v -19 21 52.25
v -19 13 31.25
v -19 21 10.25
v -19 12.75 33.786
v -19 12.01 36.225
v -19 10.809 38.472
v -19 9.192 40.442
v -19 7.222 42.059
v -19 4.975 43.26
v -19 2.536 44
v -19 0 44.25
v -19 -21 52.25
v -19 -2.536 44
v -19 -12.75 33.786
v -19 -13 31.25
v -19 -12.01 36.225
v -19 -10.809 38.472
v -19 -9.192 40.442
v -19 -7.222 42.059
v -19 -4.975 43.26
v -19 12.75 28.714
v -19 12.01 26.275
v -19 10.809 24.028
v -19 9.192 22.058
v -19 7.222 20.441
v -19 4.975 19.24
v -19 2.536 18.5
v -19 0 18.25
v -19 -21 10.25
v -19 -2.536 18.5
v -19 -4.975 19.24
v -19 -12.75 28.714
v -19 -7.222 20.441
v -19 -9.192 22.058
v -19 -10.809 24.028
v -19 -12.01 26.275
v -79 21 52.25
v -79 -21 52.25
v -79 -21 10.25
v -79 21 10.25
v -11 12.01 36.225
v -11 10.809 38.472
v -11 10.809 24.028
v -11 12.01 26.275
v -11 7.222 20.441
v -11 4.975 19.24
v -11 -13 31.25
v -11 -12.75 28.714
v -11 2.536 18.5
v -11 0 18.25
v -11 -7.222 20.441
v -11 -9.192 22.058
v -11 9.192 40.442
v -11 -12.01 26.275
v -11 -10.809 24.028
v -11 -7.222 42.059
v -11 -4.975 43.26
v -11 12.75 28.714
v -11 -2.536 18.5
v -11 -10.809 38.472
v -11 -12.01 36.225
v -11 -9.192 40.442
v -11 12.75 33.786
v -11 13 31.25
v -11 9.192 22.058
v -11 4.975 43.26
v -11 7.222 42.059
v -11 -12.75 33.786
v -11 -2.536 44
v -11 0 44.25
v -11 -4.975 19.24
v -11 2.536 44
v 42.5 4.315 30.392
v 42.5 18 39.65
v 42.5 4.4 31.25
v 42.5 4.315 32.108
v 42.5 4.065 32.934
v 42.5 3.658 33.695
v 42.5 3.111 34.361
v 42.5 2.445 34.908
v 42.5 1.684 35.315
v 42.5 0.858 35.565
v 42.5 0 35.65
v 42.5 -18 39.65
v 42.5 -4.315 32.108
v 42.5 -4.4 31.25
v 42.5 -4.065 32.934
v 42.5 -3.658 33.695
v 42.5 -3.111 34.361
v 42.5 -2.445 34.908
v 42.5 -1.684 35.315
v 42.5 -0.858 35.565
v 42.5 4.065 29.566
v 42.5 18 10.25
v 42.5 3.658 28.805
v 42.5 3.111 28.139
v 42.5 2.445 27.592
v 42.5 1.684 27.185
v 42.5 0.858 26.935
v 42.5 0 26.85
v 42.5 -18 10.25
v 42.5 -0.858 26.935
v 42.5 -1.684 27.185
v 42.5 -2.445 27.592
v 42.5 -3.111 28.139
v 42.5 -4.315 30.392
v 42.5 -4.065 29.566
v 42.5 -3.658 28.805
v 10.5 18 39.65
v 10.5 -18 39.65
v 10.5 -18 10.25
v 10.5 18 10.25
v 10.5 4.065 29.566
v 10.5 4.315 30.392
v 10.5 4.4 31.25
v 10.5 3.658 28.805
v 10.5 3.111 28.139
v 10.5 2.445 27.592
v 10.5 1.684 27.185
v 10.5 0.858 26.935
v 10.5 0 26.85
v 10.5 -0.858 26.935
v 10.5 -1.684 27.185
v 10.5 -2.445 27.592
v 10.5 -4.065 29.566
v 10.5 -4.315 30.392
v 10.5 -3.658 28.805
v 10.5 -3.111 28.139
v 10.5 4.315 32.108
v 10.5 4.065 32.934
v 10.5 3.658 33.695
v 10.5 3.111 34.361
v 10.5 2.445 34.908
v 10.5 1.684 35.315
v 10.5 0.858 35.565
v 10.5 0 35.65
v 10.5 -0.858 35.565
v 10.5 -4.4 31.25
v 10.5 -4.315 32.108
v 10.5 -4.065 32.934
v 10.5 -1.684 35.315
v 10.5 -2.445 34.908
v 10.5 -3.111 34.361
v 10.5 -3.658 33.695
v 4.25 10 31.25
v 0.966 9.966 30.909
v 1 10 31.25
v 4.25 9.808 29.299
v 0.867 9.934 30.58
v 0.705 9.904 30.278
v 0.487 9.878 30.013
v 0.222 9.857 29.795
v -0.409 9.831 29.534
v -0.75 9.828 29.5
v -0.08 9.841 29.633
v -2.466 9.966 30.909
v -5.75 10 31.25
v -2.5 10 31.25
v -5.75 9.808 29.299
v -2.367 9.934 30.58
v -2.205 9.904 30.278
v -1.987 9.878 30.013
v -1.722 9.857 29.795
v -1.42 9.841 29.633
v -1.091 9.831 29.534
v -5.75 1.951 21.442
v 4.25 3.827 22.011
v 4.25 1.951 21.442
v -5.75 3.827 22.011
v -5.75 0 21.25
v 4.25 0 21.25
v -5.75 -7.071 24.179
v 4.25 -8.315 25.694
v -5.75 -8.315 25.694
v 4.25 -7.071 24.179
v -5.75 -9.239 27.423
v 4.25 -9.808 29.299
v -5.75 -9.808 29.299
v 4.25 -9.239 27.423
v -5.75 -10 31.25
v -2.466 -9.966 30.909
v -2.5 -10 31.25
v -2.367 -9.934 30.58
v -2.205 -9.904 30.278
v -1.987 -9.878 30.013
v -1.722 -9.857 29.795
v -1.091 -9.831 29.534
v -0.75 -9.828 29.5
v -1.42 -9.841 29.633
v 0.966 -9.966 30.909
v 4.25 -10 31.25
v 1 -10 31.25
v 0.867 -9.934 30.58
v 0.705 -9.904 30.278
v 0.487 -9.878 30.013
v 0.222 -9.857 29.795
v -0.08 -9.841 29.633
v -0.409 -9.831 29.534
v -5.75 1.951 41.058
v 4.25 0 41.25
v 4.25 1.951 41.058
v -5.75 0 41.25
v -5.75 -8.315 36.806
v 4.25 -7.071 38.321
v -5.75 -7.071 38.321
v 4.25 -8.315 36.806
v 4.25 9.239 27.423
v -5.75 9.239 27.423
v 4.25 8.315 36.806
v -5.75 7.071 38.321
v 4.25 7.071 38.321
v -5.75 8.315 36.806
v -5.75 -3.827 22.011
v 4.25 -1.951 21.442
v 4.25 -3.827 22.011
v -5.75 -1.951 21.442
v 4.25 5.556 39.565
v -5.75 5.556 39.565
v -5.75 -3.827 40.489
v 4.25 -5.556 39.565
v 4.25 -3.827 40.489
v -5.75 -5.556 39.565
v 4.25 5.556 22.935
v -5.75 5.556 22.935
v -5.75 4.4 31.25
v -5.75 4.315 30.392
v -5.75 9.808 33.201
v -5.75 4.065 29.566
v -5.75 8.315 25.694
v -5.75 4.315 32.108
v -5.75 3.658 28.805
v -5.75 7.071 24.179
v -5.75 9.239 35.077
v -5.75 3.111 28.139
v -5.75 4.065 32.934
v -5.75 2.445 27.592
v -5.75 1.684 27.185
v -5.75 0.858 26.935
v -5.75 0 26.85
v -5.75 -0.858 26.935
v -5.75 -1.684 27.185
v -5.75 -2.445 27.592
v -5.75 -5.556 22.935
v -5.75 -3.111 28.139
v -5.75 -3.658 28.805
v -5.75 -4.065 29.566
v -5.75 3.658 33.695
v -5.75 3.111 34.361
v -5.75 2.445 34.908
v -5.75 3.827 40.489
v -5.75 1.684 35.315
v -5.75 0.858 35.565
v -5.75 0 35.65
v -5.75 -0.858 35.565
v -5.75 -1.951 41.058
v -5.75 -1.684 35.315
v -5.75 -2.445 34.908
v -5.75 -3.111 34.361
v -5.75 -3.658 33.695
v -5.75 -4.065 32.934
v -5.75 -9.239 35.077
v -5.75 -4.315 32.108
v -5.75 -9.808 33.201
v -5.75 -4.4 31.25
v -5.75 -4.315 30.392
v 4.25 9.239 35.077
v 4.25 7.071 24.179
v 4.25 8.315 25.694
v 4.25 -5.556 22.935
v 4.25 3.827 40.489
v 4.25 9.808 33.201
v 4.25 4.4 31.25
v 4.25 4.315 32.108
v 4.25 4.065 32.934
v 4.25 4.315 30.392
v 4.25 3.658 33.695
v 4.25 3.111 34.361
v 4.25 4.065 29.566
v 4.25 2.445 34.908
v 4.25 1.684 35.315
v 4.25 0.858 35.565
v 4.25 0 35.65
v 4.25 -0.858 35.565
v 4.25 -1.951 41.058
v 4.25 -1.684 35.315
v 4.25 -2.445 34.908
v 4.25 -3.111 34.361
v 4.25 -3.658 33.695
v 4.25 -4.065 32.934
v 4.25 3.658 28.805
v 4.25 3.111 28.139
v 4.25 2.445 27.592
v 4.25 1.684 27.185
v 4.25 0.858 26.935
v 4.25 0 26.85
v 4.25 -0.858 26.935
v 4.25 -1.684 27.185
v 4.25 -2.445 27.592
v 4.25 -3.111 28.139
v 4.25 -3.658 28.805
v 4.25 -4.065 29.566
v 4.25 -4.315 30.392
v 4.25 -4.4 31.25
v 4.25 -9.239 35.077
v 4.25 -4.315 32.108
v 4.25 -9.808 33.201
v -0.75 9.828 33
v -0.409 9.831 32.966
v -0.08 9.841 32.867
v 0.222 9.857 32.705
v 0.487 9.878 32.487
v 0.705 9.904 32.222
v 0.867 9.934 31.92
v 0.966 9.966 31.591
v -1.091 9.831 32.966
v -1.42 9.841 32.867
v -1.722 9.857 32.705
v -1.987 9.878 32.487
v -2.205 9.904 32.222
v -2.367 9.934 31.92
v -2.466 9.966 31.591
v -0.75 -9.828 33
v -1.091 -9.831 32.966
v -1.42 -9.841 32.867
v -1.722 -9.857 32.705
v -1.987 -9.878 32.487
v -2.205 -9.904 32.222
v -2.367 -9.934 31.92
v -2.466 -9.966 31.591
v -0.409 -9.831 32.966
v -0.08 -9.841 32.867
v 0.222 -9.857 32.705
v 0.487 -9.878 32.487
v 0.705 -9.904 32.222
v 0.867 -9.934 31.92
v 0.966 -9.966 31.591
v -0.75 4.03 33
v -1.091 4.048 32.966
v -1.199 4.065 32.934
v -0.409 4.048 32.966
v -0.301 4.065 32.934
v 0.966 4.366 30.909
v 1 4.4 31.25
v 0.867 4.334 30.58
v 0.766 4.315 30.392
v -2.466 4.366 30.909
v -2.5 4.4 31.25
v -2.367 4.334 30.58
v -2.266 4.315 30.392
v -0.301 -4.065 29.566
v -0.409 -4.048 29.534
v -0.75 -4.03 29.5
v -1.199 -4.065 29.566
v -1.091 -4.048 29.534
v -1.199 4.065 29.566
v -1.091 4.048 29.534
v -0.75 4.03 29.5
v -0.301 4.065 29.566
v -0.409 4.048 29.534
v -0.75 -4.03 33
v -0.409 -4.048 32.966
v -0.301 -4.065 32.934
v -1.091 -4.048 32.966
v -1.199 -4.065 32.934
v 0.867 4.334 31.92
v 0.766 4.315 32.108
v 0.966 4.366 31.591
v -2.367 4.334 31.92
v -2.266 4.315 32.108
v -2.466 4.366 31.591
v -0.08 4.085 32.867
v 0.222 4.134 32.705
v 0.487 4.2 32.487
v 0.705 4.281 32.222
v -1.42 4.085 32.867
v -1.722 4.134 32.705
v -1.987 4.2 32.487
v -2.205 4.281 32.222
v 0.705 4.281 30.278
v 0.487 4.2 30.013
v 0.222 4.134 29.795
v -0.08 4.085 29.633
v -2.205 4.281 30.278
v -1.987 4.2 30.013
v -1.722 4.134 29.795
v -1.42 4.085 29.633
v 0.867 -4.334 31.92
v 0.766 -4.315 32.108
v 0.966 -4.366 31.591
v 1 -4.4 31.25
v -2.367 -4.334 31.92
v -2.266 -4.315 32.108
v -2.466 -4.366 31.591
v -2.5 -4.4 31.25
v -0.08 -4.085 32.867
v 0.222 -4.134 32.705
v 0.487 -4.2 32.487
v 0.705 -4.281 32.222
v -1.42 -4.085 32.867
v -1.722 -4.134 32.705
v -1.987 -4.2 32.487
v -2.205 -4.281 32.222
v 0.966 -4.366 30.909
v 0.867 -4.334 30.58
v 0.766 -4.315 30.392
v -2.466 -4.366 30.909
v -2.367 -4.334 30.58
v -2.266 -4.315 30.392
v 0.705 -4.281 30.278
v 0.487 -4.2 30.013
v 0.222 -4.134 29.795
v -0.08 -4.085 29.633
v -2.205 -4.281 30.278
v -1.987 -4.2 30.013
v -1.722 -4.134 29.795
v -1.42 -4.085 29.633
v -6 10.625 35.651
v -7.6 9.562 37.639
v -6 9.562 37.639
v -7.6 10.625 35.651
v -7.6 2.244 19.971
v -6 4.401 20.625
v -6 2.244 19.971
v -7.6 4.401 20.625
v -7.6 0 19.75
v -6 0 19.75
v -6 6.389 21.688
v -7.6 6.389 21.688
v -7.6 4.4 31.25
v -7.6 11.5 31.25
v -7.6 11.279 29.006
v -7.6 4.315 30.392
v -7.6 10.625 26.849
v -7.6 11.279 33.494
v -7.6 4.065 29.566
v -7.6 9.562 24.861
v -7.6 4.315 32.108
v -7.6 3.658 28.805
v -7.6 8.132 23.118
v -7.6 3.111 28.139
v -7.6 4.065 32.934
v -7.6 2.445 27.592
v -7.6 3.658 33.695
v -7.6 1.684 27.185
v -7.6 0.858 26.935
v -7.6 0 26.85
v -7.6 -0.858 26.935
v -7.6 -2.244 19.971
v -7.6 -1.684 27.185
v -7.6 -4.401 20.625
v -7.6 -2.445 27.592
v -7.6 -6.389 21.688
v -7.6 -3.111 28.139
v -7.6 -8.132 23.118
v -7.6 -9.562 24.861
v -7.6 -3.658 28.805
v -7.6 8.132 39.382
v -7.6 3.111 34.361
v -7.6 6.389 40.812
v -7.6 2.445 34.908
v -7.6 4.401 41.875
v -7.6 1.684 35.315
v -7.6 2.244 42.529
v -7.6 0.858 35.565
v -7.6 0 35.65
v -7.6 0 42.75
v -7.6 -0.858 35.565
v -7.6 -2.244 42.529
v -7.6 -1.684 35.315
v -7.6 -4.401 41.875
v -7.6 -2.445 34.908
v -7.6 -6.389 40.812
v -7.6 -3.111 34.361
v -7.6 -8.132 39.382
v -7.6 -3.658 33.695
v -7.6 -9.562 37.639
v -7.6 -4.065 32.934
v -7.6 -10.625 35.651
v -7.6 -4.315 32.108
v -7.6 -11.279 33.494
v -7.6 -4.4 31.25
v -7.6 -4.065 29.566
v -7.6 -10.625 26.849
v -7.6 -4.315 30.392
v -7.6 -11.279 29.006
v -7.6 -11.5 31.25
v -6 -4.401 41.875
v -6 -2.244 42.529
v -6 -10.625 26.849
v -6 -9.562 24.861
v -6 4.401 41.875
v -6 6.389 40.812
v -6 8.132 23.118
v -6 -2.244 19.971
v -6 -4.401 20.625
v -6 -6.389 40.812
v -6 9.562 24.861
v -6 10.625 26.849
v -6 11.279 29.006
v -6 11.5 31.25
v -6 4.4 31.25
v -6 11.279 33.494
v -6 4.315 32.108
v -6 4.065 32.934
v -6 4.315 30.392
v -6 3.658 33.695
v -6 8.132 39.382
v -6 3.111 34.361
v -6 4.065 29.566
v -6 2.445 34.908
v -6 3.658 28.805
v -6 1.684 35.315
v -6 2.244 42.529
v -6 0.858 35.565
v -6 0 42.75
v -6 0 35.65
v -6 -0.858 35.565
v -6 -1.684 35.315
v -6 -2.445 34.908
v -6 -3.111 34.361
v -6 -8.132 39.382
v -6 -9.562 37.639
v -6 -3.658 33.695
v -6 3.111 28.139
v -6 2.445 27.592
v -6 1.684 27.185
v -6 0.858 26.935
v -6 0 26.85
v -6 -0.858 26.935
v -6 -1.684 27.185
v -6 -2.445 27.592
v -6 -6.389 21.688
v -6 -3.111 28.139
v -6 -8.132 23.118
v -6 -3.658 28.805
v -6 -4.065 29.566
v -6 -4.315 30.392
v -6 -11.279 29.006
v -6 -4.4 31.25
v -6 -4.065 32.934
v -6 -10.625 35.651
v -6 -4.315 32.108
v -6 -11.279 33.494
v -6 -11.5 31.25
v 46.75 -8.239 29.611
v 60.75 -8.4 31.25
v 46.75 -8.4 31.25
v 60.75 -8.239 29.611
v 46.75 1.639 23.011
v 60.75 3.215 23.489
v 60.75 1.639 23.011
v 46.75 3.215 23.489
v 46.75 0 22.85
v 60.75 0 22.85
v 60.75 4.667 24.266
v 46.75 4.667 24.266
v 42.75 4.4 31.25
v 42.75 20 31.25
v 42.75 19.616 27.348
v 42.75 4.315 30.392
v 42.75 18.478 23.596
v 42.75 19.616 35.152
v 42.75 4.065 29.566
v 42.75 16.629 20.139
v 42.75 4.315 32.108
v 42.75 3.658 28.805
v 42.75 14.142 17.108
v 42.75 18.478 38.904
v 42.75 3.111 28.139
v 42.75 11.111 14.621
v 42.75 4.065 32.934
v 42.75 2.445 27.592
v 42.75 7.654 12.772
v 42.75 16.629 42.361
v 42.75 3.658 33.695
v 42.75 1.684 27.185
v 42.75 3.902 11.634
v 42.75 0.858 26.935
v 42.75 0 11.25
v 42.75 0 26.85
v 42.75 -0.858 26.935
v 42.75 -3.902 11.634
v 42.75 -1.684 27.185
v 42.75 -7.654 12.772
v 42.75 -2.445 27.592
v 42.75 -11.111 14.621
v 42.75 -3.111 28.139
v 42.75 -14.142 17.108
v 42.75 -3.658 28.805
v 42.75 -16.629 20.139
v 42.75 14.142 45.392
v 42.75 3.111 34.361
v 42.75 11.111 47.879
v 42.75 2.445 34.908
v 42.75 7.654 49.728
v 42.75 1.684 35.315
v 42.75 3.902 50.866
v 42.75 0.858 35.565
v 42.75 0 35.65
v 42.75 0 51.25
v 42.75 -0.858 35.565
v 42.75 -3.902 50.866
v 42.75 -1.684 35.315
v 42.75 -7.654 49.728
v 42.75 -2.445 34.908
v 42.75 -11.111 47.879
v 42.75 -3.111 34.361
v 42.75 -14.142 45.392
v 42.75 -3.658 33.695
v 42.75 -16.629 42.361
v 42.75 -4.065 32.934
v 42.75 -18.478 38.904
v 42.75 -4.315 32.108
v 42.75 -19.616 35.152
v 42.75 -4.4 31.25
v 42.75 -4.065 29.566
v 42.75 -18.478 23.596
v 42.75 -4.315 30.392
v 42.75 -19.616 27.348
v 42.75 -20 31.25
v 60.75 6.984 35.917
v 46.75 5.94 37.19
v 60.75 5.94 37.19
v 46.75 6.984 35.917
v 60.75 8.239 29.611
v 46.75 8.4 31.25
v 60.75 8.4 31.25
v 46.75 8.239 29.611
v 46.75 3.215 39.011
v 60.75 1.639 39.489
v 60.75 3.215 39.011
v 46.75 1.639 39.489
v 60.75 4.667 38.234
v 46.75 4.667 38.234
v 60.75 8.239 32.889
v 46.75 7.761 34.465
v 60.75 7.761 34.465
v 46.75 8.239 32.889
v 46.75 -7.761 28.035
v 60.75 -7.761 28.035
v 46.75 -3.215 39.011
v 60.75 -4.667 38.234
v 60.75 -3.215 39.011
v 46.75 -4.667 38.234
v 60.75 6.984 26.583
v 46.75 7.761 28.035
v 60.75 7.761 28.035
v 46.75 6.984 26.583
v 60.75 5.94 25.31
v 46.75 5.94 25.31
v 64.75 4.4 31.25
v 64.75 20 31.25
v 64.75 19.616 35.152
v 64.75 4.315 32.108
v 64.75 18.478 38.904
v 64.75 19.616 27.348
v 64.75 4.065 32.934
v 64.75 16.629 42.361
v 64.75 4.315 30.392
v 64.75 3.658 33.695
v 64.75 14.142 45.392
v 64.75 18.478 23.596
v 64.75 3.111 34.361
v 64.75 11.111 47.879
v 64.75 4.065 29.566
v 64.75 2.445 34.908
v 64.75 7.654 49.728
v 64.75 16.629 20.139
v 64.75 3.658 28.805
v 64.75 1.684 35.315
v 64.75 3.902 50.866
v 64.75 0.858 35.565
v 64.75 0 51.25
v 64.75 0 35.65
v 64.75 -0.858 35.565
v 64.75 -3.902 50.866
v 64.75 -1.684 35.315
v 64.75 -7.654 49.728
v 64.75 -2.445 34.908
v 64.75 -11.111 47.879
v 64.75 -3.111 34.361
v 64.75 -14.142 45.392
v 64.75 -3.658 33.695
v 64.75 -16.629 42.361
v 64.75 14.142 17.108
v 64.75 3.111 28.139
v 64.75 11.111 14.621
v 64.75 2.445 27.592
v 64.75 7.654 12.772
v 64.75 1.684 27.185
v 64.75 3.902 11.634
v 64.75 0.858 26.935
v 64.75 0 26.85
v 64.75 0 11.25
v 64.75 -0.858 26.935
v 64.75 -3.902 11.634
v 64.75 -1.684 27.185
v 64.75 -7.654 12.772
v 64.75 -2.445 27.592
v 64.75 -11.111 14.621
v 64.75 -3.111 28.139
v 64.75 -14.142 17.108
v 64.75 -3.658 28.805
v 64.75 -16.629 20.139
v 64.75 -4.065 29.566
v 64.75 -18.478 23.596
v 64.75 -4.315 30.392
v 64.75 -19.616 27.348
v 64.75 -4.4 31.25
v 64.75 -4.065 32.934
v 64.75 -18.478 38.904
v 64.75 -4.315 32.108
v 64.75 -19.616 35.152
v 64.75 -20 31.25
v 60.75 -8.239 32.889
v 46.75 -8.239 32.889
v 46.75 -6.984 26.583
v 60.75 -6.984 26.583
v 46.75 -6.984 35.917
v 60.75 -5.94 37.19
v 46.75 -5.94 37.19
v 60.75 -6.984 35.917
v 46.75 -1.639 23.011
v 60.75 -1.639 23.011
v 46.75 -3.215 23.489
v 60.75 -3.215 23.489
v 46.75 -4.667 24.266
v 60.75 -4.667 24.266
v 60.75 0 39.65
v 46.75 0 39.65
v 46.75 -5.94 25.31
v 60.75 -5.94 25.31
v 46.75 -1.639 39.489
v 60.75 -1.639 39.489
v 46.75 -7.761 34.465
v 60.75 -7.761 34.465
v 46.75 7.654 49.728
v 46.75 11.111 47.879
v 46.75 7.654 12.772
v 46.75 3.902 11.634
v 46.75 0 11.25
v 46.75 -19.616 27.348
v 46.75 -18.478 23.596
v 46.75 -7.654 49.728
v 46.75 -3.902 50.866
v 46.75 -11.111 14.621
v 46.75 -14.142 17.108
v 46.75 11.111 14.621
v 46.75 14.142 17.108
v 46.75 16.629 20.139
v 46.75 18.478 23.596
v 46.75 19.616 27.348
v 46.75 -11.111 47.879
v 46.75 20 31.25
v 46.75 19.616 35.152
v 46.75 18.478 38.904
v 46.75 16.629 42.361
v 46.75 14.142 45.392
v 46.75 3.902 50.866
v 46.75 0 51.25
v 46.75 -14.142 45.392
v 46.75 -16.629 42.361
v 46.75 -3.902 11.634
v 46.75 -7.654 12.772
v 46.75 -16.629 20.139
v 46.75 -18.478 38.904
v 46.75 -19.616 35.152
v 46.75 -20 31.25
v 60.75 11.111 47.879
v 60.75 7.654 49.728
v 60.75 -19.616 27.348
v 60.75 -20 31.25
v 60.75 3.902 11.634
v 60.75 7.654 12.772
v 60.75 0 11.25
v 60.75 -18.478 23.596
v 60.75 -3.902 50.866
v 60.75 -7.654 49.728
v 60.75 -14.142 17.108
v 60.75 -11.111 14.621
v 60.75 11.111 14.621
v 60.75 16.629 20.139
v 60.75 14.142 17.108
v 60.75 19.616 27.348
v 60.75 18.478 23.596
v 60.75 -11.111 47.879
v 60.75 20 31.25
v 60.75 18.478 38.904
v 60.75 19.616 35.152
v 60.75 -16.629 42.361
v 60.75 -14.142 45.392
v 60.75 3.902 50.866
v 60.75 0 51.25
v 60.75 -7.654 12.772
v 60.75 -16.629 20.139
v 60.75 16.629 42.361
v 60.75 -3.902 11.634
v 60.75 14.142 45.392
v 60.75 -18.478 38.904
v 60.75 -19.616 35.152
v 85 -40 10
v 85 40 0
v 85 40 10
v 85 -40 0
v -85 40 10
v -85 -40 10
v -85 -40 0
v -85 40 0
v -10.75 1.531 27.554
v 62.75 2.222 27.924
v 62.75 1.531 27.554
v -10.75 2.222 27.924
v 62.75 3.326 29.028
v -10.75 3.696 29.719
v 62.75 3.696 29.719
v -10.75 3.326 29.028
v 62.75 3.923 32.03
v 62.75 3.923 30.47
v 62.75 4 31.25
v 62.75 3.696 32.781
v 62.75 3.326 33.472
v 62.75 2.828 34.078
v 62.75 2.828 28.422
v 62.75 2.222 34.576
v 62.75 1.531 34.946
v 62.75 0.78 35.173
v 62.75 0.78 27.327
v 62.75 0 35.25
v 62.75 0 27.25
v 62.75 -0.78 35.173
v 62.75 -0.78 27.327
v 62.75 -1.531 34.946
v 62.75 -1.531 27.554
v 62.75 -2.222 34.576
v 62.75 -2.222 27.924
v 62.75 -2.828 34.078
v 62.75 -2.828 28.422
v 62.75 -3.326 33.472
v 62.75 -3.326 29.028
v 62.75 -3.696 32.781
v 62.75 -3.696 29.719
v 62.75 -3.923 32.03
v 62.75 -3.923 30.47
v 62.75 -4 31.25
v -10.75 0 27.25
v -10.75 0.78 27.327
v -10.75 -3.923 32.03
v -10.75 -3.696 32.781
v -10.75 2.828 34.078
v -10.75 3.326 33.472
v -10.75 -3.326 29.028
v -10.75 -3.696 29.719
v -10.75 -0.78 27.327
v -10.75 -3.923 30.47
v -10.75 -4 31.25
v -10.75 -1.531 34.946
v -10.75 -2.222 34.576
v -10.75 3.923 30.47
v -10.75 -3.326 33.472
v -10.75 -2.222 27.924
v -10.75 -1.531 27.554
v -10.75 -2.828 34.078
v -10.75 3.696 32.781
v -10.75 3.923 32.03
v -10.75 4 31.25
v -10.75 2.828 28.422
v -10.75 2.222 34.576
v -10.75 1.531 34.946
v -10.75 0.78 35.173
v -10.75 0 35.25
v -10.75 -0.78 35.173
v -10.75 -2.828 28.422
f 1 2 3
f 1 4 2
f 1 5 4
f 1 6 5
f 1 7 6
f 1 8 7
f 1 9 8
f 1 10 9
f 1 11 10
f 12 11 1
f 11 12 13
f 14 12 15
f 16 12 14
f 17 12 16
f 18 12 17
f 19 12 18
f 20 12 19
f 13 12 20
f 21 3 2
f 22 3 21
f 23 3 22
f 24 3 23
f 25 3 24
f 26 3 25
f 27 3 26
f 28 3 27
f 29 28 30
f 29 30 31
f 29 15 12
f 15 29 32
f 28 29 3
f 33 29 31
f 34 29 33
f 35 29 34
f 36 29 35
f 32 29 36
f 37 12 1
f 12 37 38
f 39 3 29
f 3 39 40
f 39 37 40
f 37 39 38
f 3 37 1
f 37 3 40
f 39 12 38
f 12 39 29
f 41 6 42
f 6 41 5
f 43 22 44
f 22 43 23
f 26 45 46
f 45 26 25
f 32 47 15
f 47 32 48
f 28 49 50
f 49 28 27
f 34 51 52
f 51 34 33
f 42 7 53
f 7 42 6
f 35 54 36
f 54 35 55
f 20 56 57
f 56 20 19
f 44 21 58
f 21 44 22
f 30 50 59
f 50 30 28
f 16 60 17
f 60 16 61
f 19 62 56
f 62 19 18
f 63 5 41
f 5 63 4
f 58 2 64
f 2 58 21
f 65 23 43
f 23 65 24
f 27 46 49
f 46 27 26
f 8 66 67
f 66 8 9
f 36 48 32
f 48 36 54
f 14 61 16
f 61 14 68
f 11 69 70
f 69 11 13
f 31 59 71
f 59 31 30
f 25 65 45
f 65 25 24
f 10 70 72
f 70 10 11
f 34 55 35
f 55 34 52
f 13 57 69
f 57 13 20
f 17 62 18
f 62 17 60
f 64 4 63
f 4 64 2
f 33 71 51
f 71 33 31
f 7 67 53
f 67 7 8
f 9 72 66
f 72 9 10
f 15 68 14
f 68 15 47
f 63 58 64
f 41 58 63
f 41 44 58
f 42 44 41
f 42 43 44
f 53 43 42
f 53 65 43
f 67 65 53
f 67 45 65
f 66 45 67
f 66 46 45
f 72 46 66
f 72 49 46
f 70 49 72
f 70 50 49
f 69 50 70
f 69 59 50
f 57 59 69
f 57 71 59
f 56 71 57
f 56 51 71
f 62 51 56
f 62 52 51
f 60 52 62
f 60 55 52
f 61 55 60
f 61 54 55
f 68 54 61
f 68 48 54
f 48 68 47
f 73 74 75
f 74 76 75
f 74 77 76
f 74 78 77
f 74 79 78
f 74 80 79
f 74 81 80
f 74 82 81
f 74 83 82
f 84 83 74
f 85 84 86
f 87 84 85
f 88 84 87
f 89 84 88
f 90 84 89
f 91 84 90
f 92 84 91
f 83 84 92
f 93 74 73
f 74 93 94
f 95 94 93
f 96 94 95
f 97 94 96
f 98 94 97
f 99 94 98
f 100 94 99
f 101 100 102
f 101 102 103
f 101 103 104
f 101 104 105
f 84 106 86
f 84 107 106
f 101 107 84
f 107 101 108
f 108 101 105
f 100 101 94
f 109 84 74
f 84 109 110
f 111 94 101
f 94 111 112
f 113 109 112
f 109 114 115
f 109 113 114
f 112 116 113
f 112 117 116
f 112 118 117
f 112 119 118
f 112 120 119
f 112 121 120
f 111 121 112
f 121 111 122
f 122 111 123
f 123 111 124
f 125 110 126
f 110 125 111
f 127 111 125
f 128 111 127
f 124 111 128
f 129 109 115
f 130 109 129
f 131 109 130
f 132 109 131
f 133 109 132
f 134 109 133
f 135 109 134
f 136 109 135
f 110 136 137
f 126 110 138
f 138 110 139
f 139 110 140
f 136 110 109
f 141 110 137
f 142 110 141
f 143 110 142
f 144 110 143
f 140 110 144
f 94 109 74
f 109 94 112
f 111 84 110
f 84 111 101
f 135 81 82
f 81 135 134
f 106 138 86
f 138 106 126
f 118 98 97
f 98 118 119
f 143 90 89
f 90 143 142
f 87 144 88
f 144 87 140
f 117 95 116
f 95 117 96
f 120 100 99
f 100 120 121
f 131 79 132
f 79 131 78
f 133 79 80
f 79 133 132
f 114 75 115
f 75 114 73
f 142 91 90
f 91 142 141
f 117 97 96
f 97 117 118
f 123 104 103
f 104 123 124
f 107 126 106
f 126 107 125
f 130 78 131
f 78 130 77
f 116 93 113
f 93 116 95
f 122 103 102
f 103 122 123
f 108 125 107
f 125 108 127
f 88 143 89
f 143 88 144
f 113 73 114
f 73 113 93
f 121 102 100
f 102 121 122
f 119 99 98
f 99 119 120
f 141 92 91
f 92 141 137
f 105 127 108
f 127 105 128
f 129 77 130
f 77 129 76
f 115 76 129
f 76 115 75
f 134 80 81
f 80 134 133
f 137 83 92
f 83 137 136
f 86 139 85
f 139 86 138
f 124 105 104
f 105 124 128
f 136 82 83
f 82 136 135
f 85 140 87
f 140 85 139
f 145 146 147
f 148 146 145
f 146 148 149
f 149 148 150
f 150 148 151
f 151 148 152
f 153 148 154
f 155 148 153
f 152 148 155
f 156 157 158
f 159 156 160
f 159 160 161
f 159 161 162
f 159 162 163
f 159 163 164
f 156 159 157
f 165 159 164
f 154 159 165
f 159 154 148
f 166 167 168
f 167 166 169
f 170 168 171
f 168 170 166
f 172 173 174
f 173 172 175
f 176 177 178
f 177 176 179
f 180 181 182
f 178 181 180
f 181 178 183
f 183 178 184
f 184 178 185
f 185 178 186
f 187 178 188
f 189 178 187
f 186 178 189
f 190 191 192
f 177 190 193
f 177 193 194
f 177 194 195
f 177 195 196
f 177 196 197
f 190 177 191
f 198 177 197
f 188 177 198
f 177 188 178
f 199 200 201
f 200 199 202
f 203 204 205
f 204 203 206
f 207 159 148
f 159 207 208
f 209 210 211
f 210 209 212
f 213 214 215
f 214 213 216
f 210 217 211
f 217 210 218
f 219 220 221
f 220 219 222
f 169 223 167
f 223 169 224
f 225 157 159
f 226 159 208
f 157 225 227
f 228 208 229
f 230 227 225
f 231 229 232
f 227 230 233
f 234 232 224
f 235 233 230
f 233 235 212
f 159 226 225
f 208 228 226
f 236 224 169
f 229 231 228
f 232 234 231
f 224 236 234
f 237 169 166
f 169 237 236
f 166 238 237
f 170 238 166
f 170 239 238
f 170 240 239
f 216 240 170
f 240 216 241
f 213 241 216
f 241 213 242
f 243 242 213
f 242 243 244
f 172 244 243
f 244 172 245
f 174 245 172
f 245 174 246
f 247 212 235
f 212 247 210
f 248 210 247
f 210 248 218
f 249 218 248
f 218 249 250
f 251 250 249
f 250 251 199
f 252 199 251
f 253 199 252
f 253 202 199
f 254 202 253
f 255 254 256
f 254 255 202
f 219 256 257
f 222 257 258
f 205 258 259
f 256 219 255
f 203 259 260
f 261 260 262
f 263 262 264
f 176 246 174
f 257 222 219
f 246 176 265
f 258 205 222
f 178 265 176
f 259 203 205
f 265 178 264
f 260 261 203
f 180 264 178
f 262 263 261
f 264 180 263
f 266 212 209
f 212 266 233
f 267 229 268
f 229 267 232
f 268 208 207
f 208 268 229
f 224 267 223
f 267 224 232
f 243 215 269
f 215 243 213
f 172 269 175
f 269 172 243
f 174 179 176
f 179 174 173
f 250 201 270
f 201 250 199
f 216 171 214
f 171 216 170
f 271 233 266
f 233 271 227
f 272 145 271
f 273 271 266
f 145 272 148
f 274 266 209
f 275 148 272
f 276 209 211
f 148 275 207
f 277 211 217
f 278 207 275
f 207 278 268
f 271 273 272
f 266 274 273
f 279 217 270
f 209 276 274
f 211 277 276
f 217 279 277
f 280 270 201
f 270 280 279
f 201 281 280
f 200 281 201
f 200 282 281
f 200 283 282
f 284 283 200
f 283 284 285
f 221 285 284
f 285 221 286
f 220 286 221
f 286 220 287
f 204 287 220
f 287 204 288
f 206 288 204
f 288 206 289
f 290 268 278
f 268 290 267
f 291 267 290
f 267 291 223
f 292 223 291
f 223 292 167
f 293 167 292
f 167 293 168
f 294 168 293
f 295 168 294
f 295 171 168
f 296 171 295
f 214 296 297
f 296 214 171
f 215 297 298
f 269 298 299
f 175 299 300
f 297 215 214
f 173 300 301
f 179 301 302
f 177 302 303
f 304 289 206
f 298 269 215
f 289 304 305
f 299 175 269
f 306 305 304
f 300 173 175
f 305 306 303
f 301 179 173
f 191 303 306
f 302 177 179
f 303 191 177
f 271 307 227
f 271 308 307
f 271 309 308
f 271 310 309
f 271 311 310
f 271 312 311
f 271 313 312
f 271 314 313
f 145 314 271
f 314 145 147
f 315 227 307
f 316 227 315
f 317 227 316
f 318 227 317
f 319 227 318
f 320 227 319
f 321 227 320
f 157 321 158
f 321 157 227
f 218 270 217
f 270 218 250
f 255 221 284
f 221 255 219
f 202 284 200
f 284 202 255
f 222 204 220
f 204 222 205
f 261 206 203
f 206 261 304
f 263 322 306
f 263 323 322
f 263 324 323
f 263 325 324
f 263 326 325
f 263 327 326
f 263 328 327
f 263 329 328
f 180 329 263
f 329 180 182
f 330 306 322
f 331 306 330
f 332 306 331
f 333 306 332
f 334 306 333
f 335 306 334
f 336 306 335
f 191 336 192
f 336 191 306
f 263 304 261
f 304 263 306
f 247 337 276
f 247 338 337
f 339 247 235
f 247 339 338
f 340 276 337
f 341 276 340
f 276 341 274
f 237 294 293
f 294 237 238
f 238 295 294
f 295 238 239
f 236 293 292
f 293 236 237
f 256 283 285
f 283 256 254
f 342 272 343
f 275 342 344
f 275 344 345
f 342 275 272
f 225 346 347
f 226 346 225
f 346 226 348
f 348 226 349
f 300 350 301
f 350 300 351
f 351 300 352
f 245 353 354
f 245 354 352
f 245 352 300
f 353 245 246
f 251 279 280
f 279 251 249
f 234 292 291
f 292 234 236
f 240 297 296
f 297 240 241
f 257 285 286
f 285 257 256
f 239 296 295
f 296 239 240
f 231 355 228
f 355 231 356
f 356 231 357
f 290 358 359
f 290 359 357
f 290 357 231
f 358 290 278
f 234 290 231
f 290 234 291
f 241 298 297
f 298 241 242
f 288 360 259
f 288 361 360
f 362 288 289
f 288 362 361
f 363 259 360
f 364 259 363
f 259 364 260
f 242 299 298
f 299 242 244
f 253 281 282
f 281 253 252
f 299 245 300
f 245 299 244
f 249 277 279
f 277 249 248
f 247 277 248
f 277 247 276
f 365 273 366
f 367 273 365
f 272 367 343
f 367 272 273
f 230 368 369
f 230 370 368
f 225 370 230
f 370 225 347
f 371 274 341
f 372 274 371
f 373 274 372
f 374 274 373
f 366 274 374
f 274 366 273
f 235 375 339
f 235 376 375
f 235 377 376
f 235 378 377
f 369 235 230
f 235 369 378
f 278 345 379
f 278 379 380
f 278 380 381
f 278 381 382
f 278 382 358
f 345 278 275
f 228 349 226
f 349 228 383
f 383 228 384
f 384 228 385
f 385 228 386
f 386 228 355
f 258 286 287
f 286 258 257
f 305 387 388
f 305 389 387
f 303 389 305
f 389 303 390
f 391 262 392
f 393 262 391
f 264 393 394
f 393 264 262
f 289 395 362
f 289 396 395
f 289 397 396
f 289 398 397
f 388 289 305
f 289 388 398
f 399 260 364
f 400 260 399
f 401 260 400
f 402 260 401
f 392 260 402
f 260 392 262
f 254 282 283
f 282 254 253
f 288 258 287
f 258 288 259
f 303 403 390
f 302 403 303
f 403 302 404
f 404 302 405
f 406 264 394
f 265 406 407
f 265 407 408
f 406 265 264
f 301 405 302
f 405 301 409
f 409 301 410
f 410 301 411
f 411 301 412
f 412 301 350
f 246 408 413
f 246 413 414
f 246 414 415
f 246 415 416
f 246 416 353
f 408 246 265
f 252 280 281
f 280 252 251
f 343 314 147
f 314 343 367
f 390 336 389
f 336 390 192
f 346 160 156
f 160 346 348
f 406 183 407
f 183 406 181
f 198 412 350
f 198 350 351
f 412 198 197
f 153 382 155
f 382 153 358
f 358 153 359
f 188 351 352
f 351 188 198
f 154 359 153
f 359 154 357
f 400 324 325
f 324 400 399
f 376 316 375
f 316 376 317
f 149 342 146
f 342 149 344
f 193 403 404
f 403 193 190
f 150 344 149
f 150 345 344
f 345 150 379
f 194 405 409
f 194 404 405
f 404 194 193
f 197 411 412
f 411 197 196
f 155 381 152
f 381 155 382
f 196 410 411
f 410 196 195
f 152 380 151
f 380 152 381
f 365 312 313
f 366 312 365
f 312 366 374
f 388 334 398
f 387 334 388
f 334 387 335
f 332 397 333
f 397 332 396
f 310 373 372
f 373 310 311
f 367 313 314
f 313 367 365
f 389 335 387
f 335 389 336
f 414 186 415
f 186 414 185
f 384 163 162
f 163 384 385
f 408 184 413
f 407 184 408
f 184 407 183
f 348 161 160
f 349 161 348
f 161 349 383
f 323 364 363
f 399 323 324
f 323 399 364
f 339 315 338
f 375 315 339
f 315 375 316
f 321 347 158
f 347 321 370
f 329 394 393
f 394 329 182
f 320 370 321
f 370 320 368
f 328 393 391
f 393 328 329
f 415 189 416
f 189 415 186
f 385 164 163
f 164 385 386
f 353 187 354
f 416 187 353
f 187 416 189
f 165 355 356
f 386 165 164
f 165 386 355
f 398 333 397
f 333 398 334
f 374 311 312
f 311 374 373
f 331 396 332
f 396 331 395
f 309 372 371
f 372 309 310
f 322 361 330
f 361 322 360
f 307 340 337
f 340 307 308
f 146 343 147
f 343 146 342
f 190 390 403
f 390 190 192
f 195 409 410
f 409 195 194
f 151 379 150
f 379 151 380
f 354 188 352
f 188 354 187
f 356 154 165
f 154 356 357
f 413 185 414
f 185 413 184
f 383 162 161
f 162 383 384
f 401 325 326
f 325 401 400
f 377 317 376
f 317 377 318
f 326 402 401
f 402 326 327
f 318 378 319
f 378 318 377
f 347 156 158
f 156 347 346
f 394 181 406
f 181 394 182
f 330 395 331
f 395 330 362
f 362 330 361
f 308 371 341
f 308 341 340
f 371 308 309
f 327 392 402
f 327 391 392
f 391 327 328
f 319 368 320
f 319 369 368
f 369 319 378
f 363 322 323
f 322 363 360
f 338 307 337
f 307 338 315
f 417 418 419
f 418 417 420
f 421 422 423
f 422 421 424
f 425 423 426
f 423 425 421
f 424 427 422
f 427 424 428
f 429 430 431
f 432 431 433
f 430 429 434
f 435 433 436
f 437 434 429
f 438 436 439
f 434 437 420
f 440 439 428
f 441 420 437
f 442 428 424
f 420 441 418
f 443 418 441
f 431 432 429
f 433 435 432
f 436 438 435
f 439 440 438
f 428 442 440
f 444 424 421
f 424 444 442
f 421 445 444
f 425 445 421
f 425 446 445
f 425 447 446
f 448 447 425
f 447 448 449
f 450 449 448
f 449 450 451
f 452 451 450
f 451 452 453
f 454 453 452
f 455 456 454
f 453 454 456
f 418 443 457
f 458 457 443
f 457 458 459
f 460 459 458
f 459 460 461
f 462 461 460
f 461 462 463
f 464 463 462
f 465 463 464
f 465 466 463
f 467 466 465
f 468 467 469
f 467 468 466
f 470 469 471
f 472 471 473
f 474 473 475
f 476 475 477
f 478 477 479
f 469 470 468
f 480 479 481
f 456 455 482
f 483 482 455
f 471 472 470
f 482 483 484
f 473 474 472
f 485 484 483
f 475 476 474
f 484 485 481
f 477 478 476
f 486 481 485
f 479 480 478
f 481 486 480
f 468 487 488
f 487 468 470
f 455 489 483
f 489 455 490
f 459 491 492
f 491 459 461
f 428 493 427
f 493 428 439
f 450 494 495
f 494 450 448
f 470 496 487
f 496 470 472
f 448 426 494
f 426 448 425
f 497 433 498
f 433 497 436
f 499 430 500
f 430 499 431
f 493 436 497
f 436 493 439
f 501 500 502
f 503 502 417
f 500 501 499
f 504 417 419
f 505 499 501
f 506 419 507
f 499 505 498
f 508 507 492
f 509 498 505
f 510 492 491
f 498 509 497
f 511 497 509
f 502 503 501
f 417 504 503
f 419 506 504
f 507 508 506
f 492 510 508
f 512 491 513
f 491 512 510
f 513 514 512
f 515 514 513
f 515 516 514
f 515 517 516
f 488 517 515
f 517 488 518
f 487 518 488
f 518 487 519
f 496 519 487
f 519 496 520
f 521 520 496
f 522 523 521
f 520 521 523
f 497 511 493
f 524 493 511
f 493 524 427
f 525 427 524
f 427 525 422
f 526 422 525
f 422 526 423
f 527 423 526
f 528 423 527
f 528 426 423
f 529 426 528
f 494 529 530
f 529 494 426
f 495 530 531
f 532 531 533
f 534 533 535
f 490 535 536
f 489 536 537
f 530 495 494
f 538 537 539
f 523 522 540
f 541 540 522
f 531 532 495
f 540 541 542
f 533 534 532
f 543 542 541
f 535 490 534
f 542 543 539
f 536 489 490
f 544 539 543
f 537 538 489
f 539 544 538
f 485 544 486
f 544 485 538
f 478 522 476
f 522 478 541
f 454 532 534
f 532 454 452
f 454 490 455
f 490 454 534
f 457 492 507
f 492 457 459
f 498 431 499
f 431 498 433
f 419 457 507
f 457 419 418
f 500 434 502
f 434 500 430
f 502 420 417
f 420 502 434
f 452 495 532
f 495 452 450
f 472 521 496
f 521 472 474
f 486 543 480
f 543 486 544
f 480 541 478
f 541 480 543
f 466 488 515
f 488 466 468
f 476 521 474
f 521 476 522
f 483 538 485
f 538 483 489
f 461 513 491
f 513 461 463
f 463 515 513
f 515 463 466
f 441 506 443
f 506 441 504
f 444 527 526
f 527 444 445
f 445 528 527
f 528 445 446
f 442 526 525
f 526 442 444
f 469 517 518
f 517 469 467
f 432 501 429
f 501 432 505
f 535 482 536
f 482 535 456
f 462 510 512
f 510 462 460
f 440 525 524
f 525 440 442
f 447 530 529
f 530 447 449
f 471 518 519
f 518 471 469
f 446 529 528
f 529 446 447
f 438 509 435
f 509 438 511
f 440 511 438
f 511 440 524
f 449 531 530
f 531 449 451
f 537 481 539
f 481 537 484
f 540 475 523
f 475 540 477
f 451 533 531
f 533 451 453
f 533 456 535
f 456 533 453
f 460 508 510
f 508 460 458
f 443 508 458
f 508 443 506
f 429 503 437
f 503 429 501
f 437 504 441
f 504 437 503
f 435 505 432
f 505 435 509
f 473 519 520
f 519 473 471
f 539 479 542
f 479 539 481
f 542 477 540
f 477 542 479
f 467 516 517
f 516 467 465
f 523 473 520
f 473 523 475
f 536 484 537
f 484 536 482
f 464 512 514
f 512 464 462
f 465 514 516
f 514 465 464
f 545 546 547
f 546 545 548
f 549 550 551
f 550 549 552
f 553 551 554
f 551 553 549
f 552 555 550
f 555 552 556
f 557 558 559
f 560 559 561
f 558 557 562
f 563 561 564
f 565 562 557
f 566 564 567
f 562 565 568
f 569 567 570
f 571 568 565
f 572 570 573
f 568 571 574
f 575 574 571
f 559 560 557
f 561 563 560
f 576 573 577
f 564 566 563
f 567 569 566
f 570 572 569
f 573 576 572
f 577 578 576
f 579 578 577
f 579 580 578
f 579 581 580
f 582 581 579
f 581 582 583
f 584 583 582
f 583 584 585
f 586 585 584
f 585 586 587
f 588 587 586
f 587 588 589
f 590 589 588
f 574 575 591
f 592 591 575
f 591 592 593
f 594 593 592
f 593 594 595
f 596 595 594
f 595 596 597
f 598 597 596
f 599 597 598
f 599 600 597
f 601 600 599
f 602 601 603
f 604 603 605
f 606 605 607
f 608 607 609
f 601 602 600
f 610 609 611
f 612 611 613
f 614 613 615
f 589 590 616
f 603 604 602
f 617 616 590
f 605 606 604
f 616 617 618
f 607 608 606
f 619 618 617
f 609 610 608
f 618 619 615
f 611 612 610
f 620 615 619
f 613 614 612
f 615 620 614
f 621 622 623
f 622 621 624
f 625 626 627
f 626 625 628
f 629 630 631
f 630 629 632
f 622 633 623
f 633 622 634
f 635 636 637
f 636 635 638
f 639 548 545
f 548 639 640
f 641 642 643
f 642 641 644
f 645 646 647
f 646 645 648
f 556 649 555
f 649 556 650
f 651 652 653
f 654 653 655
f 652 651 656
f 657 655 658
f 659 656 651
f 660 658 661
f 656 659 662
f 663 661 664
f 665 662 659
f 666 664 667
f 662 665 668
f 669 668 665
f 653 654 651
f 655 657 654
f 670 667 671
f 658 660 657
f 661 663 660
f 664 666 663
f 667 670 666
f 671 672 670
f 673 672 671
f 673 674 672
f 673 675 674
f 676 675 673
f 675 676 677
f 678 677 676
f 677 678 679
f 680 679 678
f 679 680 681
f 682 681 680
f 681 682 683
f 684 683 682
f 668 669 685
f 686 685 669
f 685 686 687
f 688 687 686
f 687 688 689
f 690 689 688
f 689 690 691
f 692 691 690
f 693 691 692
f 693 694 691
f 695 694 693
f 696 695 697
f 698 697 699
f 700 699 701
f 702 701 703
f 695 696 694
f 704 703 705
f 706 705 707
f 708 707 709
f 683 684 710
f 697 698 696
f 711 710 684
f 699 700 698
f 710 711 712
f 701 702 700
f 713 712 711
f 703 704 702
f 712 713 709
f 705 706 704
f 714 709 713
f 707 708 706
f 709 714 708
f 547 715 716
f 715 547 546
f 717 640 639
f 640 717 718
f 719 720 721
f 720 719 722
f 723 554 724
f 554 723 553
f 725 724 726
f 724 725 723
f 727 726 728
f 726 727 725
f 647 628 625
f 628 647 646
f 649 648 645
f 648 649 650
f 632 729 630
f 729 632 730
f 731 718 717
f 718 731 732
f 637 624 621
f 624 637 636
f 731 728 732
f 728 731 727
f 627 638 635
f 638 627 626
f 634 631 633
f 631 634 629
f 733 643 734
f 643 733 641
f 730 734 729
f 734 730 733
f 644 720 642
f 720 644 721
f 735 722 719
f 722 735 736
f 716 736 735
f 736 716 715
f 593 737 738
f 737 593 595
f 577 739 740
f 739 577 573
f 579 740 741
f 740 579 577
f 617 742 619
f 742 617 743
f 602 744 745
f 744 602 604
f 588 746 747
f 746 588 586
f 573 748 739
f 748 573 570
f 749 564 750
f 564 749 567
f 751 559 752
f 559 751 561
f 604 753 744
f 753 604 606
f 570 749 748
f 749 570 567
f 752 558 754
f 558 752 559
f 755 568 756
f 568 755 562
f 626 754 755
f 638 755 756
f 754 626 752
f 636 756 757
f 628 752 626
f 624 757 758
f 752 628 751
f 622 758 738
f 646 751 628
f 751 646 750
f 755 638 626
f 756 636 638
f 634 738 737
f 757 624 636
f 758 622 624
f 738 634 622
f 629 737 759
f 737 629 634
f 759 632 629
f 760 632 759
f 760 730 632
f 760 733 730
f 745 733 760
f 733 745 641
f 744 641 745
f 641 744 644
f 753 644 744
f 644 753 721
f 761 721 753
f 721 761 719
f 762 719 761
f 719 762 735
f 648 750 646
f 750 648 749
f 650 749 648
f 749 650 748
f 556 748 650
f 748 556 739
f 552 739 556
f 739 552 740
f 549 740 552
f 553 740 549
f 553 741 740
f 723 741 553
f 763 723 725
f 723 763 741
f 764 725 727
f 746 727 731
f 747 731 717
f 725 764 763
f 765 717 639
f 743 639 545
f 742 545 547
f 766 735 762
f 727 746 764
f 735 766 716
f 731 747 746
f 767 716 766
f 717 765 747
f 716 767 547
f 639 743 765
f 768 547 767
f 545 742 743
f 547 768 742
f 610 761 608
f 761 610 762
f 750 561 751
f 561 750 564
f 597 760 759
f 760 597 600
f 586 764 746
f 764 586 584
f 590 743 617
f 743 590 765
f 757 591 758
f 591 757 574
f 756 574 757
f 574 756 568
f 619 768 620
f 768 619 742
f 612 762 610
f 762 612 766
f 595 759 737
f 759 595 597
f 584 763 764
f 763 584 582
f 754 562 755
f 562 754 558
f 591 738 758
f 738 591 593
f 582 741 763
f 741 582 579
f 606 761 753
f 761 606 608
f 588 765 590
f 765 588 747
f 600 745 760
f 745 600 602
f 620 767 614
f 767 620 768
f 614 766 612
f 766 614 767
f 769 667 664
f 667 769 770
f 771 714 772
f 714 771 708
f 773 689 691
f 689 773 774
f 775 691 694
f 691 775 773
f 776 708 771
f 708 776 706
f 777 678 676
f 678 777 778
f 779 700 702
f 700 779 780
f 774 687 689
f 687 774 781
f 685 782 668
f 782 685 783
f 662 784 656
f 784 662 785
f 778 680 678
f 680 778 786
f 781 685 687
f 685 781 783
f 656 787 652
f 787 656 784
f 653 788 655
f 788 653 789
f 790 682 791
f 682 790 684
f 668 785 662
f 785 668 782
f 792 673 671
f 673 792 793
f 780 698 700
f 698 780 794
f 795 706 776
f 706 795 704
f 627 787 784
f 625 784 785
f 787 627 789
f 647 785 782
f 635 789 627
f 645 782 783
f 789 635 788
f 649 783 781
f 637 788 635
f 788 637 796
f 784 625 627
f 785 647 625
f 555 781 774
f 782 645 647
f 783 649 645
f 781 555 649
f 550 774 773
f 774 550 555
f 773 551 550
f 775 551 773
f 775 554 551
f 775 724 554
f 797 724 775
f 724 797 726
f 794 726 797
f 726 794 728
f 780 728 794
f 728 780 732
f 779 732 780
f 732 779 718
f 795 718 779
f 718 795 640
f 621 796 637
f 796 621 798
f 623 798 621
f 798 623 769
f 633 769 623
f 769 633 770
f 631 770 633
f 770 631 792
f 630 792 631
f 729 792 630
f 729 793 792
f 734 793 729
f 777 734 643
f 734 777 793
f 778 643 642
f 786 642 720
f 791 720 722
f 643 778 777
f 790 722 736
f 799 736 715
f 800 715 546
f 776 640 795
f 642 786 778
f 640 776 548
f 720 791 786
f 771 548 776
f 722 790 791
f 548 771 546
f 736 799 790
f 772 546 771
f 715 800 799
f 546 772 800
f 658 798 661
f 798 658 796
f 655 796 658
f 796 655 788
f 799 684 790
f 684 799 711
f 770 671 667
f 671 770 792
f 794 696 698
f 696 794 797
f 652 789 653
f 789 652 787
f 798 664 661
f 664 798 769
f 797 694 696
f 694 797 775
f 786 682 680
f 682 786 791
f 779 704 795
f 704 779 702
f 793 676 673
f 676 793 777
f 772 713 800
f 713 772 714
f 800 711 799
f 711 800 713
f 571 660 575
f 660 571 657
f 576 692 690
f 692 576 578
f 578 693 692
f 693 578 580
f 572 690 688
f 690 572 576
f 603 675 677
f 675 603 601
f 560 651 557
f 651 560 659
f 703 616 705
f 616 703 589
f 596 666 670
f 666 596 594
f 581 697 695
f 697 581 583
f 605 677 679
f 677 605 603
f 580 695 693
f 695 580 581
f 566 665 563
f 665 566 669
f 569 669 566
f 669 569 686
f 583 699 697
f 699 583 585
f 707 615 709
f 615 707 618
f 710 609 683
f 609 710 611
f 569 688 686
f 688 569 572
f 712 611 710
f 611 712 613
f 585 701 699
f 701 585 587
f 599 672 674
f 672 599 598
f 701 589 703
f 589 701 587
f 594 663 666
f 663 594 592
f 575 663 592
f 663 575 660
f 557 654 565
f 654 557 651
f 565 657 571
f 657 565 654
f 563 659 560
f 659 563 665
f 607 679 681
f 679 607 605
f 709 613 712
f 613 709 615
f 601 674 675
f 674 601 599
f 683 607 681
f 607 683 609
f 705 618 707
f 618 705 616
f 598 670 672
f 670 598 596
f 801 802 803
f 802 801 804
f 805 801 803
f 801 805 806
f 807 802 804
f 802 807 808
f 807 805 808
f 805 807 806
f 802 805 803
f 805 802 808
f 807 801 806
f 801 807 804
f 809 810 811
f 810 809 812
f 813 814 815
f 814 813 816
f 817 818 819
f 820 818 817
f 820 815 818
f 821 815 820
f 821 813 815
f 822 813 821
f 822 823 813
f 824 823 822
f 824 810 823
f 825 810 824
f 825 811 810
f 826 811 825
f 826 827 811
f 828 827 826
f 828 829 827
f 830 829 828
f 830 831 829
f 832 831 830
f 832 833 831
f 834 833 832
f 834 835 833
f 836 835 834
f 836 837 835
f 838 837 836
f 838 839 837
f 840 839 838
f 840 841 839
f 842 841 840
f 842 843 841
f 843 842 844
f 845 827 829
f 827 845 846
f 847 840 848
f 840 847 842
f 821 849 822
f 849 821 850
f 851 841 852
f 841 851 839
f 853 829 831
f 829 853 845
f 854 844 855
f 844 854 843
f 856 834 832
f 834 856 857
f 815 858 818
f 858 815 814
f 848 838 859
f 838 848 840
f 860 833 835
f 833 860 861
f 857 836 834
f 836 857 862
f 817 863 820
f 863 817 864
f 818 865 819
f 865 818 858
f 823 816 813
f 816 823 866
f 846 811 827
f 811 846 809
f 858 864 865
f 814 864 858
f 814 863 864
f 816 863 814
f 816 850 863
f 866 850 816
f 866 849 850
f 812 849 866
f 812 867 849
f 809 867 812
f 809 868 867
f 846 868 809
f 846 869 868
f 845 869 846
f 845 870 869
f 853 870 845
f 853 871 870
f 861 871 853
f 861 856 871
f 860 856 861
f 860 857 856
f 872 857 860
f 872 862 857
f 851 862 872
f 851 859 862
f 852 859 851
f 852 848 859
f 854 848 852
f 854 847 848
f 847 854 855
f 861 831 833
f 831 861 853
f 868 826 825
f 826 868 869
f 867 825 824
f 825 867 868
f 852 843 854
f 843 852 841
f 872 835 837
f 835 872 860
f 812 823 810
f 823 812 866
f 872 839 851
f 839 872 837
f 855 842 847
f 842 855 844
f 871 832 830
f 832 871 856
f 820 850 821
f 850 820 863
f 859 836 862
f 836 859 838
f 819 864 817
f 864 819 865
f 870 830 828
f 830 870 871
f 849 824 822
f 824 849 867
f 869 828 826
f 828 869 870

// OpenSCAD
$fn = 32;

// ------------------------------------------------------------------------
// Motor drive station: motor 60 x 42 mm, shaft d8, pulley d40
// Every part is its own module, assembly() places every instance.
// ------------------------------------------------------------------------

// --- part 1 ---
module station_bed() {
  difference() {
    translate([-85, -40, 0]) cube([170, 80, 10]);
  }
}

// --- part 2 ---
module drive_motor() {
  union() {
    translate([-30, -21, 0]) cube([60, 42, 42]);
    translate([34, 0, 21]) rotate([0, 90, 0]) cylinder(h = 8, d = 26, center = true);
  }
}

// --- part 3 ---
module pillow_block() {
  difference() {
    translate([-16, -18, 0]) cube([32, 36, 29.4]);
    translate([0, 0, 21]) rotate([0, 90, 0]) cylinder(h = 34, d = 8.8, center = true);
  }
}

// --- part 4 ---
module drive_shaft() {
  translate([0, 0, -36.75]) cylinder(h = 73.5, d = 8);
}

// --- part 5 ---
module shaft_collar() {
  difference() {
    cylinder(h = 10, d = 20);
    translate([0, 0, -1]) cylinder(h = 12, d = 8.8);
    translate([0, 0, 5]) rotate([90, 0, 0]) cylinder(h = 22, d = 3.5, center = true);
  }
}

// --- part 6 ---
module collar_washer() {
  difference() {
      translate([0, 0, 0]) cylinder(h = 1.6, d = 23);
      translate([0, 0, -1]) cylinder(h = 3.6, d = 8.8);
    }
}

// --- part 7 ---
module drive_pulley() {
  difference() {
    union() {
      cylinder(h = 22, d = 16.8);
      cylinder(h = 4, d = 40);
      translate([0, 0, 18]) cylinder(h = 4, d = 40);
    }
    translate([0, 0, -1]) cylinder(h = 24, d = 8.8);
  }
}

// --- assembly ---
module assembly() {
  color([0.80, 0.24, 0.20]) translate([0, 0, 0]) rotate([0, 0, 0]) station_bed();
  color([0.20, 0.45, 0.75]) translate([-49, 0, 10.25]) rotate([0, 0, 0]) drive_motor();
  color([0.25, 0.62, 0.32]) translate([26.5, 0, 10.25]) rotate([0, 0, 0]) pillow_block();
  color([0.92, 0.70, 0.18]) translate([26, 0, 31.25]) rotate([0, 90, 0]) drive_shaft();
  color([0.58, 0.35, 0.70]) translate([-5.75, 0, 31.25]) rotate([0, 90, 0]) shaft_collar();
  color([0.16, 0.66, 0.66]) translate([-7.6, 0, 31.25]) rotate([0, 90, 0]) collar_washer();
  color([0.85, 0.48, 0.18]) translate([42.75, 0, 31.25]) rotate([0, 90, 0]) drive_pulley();
}

assembly();
